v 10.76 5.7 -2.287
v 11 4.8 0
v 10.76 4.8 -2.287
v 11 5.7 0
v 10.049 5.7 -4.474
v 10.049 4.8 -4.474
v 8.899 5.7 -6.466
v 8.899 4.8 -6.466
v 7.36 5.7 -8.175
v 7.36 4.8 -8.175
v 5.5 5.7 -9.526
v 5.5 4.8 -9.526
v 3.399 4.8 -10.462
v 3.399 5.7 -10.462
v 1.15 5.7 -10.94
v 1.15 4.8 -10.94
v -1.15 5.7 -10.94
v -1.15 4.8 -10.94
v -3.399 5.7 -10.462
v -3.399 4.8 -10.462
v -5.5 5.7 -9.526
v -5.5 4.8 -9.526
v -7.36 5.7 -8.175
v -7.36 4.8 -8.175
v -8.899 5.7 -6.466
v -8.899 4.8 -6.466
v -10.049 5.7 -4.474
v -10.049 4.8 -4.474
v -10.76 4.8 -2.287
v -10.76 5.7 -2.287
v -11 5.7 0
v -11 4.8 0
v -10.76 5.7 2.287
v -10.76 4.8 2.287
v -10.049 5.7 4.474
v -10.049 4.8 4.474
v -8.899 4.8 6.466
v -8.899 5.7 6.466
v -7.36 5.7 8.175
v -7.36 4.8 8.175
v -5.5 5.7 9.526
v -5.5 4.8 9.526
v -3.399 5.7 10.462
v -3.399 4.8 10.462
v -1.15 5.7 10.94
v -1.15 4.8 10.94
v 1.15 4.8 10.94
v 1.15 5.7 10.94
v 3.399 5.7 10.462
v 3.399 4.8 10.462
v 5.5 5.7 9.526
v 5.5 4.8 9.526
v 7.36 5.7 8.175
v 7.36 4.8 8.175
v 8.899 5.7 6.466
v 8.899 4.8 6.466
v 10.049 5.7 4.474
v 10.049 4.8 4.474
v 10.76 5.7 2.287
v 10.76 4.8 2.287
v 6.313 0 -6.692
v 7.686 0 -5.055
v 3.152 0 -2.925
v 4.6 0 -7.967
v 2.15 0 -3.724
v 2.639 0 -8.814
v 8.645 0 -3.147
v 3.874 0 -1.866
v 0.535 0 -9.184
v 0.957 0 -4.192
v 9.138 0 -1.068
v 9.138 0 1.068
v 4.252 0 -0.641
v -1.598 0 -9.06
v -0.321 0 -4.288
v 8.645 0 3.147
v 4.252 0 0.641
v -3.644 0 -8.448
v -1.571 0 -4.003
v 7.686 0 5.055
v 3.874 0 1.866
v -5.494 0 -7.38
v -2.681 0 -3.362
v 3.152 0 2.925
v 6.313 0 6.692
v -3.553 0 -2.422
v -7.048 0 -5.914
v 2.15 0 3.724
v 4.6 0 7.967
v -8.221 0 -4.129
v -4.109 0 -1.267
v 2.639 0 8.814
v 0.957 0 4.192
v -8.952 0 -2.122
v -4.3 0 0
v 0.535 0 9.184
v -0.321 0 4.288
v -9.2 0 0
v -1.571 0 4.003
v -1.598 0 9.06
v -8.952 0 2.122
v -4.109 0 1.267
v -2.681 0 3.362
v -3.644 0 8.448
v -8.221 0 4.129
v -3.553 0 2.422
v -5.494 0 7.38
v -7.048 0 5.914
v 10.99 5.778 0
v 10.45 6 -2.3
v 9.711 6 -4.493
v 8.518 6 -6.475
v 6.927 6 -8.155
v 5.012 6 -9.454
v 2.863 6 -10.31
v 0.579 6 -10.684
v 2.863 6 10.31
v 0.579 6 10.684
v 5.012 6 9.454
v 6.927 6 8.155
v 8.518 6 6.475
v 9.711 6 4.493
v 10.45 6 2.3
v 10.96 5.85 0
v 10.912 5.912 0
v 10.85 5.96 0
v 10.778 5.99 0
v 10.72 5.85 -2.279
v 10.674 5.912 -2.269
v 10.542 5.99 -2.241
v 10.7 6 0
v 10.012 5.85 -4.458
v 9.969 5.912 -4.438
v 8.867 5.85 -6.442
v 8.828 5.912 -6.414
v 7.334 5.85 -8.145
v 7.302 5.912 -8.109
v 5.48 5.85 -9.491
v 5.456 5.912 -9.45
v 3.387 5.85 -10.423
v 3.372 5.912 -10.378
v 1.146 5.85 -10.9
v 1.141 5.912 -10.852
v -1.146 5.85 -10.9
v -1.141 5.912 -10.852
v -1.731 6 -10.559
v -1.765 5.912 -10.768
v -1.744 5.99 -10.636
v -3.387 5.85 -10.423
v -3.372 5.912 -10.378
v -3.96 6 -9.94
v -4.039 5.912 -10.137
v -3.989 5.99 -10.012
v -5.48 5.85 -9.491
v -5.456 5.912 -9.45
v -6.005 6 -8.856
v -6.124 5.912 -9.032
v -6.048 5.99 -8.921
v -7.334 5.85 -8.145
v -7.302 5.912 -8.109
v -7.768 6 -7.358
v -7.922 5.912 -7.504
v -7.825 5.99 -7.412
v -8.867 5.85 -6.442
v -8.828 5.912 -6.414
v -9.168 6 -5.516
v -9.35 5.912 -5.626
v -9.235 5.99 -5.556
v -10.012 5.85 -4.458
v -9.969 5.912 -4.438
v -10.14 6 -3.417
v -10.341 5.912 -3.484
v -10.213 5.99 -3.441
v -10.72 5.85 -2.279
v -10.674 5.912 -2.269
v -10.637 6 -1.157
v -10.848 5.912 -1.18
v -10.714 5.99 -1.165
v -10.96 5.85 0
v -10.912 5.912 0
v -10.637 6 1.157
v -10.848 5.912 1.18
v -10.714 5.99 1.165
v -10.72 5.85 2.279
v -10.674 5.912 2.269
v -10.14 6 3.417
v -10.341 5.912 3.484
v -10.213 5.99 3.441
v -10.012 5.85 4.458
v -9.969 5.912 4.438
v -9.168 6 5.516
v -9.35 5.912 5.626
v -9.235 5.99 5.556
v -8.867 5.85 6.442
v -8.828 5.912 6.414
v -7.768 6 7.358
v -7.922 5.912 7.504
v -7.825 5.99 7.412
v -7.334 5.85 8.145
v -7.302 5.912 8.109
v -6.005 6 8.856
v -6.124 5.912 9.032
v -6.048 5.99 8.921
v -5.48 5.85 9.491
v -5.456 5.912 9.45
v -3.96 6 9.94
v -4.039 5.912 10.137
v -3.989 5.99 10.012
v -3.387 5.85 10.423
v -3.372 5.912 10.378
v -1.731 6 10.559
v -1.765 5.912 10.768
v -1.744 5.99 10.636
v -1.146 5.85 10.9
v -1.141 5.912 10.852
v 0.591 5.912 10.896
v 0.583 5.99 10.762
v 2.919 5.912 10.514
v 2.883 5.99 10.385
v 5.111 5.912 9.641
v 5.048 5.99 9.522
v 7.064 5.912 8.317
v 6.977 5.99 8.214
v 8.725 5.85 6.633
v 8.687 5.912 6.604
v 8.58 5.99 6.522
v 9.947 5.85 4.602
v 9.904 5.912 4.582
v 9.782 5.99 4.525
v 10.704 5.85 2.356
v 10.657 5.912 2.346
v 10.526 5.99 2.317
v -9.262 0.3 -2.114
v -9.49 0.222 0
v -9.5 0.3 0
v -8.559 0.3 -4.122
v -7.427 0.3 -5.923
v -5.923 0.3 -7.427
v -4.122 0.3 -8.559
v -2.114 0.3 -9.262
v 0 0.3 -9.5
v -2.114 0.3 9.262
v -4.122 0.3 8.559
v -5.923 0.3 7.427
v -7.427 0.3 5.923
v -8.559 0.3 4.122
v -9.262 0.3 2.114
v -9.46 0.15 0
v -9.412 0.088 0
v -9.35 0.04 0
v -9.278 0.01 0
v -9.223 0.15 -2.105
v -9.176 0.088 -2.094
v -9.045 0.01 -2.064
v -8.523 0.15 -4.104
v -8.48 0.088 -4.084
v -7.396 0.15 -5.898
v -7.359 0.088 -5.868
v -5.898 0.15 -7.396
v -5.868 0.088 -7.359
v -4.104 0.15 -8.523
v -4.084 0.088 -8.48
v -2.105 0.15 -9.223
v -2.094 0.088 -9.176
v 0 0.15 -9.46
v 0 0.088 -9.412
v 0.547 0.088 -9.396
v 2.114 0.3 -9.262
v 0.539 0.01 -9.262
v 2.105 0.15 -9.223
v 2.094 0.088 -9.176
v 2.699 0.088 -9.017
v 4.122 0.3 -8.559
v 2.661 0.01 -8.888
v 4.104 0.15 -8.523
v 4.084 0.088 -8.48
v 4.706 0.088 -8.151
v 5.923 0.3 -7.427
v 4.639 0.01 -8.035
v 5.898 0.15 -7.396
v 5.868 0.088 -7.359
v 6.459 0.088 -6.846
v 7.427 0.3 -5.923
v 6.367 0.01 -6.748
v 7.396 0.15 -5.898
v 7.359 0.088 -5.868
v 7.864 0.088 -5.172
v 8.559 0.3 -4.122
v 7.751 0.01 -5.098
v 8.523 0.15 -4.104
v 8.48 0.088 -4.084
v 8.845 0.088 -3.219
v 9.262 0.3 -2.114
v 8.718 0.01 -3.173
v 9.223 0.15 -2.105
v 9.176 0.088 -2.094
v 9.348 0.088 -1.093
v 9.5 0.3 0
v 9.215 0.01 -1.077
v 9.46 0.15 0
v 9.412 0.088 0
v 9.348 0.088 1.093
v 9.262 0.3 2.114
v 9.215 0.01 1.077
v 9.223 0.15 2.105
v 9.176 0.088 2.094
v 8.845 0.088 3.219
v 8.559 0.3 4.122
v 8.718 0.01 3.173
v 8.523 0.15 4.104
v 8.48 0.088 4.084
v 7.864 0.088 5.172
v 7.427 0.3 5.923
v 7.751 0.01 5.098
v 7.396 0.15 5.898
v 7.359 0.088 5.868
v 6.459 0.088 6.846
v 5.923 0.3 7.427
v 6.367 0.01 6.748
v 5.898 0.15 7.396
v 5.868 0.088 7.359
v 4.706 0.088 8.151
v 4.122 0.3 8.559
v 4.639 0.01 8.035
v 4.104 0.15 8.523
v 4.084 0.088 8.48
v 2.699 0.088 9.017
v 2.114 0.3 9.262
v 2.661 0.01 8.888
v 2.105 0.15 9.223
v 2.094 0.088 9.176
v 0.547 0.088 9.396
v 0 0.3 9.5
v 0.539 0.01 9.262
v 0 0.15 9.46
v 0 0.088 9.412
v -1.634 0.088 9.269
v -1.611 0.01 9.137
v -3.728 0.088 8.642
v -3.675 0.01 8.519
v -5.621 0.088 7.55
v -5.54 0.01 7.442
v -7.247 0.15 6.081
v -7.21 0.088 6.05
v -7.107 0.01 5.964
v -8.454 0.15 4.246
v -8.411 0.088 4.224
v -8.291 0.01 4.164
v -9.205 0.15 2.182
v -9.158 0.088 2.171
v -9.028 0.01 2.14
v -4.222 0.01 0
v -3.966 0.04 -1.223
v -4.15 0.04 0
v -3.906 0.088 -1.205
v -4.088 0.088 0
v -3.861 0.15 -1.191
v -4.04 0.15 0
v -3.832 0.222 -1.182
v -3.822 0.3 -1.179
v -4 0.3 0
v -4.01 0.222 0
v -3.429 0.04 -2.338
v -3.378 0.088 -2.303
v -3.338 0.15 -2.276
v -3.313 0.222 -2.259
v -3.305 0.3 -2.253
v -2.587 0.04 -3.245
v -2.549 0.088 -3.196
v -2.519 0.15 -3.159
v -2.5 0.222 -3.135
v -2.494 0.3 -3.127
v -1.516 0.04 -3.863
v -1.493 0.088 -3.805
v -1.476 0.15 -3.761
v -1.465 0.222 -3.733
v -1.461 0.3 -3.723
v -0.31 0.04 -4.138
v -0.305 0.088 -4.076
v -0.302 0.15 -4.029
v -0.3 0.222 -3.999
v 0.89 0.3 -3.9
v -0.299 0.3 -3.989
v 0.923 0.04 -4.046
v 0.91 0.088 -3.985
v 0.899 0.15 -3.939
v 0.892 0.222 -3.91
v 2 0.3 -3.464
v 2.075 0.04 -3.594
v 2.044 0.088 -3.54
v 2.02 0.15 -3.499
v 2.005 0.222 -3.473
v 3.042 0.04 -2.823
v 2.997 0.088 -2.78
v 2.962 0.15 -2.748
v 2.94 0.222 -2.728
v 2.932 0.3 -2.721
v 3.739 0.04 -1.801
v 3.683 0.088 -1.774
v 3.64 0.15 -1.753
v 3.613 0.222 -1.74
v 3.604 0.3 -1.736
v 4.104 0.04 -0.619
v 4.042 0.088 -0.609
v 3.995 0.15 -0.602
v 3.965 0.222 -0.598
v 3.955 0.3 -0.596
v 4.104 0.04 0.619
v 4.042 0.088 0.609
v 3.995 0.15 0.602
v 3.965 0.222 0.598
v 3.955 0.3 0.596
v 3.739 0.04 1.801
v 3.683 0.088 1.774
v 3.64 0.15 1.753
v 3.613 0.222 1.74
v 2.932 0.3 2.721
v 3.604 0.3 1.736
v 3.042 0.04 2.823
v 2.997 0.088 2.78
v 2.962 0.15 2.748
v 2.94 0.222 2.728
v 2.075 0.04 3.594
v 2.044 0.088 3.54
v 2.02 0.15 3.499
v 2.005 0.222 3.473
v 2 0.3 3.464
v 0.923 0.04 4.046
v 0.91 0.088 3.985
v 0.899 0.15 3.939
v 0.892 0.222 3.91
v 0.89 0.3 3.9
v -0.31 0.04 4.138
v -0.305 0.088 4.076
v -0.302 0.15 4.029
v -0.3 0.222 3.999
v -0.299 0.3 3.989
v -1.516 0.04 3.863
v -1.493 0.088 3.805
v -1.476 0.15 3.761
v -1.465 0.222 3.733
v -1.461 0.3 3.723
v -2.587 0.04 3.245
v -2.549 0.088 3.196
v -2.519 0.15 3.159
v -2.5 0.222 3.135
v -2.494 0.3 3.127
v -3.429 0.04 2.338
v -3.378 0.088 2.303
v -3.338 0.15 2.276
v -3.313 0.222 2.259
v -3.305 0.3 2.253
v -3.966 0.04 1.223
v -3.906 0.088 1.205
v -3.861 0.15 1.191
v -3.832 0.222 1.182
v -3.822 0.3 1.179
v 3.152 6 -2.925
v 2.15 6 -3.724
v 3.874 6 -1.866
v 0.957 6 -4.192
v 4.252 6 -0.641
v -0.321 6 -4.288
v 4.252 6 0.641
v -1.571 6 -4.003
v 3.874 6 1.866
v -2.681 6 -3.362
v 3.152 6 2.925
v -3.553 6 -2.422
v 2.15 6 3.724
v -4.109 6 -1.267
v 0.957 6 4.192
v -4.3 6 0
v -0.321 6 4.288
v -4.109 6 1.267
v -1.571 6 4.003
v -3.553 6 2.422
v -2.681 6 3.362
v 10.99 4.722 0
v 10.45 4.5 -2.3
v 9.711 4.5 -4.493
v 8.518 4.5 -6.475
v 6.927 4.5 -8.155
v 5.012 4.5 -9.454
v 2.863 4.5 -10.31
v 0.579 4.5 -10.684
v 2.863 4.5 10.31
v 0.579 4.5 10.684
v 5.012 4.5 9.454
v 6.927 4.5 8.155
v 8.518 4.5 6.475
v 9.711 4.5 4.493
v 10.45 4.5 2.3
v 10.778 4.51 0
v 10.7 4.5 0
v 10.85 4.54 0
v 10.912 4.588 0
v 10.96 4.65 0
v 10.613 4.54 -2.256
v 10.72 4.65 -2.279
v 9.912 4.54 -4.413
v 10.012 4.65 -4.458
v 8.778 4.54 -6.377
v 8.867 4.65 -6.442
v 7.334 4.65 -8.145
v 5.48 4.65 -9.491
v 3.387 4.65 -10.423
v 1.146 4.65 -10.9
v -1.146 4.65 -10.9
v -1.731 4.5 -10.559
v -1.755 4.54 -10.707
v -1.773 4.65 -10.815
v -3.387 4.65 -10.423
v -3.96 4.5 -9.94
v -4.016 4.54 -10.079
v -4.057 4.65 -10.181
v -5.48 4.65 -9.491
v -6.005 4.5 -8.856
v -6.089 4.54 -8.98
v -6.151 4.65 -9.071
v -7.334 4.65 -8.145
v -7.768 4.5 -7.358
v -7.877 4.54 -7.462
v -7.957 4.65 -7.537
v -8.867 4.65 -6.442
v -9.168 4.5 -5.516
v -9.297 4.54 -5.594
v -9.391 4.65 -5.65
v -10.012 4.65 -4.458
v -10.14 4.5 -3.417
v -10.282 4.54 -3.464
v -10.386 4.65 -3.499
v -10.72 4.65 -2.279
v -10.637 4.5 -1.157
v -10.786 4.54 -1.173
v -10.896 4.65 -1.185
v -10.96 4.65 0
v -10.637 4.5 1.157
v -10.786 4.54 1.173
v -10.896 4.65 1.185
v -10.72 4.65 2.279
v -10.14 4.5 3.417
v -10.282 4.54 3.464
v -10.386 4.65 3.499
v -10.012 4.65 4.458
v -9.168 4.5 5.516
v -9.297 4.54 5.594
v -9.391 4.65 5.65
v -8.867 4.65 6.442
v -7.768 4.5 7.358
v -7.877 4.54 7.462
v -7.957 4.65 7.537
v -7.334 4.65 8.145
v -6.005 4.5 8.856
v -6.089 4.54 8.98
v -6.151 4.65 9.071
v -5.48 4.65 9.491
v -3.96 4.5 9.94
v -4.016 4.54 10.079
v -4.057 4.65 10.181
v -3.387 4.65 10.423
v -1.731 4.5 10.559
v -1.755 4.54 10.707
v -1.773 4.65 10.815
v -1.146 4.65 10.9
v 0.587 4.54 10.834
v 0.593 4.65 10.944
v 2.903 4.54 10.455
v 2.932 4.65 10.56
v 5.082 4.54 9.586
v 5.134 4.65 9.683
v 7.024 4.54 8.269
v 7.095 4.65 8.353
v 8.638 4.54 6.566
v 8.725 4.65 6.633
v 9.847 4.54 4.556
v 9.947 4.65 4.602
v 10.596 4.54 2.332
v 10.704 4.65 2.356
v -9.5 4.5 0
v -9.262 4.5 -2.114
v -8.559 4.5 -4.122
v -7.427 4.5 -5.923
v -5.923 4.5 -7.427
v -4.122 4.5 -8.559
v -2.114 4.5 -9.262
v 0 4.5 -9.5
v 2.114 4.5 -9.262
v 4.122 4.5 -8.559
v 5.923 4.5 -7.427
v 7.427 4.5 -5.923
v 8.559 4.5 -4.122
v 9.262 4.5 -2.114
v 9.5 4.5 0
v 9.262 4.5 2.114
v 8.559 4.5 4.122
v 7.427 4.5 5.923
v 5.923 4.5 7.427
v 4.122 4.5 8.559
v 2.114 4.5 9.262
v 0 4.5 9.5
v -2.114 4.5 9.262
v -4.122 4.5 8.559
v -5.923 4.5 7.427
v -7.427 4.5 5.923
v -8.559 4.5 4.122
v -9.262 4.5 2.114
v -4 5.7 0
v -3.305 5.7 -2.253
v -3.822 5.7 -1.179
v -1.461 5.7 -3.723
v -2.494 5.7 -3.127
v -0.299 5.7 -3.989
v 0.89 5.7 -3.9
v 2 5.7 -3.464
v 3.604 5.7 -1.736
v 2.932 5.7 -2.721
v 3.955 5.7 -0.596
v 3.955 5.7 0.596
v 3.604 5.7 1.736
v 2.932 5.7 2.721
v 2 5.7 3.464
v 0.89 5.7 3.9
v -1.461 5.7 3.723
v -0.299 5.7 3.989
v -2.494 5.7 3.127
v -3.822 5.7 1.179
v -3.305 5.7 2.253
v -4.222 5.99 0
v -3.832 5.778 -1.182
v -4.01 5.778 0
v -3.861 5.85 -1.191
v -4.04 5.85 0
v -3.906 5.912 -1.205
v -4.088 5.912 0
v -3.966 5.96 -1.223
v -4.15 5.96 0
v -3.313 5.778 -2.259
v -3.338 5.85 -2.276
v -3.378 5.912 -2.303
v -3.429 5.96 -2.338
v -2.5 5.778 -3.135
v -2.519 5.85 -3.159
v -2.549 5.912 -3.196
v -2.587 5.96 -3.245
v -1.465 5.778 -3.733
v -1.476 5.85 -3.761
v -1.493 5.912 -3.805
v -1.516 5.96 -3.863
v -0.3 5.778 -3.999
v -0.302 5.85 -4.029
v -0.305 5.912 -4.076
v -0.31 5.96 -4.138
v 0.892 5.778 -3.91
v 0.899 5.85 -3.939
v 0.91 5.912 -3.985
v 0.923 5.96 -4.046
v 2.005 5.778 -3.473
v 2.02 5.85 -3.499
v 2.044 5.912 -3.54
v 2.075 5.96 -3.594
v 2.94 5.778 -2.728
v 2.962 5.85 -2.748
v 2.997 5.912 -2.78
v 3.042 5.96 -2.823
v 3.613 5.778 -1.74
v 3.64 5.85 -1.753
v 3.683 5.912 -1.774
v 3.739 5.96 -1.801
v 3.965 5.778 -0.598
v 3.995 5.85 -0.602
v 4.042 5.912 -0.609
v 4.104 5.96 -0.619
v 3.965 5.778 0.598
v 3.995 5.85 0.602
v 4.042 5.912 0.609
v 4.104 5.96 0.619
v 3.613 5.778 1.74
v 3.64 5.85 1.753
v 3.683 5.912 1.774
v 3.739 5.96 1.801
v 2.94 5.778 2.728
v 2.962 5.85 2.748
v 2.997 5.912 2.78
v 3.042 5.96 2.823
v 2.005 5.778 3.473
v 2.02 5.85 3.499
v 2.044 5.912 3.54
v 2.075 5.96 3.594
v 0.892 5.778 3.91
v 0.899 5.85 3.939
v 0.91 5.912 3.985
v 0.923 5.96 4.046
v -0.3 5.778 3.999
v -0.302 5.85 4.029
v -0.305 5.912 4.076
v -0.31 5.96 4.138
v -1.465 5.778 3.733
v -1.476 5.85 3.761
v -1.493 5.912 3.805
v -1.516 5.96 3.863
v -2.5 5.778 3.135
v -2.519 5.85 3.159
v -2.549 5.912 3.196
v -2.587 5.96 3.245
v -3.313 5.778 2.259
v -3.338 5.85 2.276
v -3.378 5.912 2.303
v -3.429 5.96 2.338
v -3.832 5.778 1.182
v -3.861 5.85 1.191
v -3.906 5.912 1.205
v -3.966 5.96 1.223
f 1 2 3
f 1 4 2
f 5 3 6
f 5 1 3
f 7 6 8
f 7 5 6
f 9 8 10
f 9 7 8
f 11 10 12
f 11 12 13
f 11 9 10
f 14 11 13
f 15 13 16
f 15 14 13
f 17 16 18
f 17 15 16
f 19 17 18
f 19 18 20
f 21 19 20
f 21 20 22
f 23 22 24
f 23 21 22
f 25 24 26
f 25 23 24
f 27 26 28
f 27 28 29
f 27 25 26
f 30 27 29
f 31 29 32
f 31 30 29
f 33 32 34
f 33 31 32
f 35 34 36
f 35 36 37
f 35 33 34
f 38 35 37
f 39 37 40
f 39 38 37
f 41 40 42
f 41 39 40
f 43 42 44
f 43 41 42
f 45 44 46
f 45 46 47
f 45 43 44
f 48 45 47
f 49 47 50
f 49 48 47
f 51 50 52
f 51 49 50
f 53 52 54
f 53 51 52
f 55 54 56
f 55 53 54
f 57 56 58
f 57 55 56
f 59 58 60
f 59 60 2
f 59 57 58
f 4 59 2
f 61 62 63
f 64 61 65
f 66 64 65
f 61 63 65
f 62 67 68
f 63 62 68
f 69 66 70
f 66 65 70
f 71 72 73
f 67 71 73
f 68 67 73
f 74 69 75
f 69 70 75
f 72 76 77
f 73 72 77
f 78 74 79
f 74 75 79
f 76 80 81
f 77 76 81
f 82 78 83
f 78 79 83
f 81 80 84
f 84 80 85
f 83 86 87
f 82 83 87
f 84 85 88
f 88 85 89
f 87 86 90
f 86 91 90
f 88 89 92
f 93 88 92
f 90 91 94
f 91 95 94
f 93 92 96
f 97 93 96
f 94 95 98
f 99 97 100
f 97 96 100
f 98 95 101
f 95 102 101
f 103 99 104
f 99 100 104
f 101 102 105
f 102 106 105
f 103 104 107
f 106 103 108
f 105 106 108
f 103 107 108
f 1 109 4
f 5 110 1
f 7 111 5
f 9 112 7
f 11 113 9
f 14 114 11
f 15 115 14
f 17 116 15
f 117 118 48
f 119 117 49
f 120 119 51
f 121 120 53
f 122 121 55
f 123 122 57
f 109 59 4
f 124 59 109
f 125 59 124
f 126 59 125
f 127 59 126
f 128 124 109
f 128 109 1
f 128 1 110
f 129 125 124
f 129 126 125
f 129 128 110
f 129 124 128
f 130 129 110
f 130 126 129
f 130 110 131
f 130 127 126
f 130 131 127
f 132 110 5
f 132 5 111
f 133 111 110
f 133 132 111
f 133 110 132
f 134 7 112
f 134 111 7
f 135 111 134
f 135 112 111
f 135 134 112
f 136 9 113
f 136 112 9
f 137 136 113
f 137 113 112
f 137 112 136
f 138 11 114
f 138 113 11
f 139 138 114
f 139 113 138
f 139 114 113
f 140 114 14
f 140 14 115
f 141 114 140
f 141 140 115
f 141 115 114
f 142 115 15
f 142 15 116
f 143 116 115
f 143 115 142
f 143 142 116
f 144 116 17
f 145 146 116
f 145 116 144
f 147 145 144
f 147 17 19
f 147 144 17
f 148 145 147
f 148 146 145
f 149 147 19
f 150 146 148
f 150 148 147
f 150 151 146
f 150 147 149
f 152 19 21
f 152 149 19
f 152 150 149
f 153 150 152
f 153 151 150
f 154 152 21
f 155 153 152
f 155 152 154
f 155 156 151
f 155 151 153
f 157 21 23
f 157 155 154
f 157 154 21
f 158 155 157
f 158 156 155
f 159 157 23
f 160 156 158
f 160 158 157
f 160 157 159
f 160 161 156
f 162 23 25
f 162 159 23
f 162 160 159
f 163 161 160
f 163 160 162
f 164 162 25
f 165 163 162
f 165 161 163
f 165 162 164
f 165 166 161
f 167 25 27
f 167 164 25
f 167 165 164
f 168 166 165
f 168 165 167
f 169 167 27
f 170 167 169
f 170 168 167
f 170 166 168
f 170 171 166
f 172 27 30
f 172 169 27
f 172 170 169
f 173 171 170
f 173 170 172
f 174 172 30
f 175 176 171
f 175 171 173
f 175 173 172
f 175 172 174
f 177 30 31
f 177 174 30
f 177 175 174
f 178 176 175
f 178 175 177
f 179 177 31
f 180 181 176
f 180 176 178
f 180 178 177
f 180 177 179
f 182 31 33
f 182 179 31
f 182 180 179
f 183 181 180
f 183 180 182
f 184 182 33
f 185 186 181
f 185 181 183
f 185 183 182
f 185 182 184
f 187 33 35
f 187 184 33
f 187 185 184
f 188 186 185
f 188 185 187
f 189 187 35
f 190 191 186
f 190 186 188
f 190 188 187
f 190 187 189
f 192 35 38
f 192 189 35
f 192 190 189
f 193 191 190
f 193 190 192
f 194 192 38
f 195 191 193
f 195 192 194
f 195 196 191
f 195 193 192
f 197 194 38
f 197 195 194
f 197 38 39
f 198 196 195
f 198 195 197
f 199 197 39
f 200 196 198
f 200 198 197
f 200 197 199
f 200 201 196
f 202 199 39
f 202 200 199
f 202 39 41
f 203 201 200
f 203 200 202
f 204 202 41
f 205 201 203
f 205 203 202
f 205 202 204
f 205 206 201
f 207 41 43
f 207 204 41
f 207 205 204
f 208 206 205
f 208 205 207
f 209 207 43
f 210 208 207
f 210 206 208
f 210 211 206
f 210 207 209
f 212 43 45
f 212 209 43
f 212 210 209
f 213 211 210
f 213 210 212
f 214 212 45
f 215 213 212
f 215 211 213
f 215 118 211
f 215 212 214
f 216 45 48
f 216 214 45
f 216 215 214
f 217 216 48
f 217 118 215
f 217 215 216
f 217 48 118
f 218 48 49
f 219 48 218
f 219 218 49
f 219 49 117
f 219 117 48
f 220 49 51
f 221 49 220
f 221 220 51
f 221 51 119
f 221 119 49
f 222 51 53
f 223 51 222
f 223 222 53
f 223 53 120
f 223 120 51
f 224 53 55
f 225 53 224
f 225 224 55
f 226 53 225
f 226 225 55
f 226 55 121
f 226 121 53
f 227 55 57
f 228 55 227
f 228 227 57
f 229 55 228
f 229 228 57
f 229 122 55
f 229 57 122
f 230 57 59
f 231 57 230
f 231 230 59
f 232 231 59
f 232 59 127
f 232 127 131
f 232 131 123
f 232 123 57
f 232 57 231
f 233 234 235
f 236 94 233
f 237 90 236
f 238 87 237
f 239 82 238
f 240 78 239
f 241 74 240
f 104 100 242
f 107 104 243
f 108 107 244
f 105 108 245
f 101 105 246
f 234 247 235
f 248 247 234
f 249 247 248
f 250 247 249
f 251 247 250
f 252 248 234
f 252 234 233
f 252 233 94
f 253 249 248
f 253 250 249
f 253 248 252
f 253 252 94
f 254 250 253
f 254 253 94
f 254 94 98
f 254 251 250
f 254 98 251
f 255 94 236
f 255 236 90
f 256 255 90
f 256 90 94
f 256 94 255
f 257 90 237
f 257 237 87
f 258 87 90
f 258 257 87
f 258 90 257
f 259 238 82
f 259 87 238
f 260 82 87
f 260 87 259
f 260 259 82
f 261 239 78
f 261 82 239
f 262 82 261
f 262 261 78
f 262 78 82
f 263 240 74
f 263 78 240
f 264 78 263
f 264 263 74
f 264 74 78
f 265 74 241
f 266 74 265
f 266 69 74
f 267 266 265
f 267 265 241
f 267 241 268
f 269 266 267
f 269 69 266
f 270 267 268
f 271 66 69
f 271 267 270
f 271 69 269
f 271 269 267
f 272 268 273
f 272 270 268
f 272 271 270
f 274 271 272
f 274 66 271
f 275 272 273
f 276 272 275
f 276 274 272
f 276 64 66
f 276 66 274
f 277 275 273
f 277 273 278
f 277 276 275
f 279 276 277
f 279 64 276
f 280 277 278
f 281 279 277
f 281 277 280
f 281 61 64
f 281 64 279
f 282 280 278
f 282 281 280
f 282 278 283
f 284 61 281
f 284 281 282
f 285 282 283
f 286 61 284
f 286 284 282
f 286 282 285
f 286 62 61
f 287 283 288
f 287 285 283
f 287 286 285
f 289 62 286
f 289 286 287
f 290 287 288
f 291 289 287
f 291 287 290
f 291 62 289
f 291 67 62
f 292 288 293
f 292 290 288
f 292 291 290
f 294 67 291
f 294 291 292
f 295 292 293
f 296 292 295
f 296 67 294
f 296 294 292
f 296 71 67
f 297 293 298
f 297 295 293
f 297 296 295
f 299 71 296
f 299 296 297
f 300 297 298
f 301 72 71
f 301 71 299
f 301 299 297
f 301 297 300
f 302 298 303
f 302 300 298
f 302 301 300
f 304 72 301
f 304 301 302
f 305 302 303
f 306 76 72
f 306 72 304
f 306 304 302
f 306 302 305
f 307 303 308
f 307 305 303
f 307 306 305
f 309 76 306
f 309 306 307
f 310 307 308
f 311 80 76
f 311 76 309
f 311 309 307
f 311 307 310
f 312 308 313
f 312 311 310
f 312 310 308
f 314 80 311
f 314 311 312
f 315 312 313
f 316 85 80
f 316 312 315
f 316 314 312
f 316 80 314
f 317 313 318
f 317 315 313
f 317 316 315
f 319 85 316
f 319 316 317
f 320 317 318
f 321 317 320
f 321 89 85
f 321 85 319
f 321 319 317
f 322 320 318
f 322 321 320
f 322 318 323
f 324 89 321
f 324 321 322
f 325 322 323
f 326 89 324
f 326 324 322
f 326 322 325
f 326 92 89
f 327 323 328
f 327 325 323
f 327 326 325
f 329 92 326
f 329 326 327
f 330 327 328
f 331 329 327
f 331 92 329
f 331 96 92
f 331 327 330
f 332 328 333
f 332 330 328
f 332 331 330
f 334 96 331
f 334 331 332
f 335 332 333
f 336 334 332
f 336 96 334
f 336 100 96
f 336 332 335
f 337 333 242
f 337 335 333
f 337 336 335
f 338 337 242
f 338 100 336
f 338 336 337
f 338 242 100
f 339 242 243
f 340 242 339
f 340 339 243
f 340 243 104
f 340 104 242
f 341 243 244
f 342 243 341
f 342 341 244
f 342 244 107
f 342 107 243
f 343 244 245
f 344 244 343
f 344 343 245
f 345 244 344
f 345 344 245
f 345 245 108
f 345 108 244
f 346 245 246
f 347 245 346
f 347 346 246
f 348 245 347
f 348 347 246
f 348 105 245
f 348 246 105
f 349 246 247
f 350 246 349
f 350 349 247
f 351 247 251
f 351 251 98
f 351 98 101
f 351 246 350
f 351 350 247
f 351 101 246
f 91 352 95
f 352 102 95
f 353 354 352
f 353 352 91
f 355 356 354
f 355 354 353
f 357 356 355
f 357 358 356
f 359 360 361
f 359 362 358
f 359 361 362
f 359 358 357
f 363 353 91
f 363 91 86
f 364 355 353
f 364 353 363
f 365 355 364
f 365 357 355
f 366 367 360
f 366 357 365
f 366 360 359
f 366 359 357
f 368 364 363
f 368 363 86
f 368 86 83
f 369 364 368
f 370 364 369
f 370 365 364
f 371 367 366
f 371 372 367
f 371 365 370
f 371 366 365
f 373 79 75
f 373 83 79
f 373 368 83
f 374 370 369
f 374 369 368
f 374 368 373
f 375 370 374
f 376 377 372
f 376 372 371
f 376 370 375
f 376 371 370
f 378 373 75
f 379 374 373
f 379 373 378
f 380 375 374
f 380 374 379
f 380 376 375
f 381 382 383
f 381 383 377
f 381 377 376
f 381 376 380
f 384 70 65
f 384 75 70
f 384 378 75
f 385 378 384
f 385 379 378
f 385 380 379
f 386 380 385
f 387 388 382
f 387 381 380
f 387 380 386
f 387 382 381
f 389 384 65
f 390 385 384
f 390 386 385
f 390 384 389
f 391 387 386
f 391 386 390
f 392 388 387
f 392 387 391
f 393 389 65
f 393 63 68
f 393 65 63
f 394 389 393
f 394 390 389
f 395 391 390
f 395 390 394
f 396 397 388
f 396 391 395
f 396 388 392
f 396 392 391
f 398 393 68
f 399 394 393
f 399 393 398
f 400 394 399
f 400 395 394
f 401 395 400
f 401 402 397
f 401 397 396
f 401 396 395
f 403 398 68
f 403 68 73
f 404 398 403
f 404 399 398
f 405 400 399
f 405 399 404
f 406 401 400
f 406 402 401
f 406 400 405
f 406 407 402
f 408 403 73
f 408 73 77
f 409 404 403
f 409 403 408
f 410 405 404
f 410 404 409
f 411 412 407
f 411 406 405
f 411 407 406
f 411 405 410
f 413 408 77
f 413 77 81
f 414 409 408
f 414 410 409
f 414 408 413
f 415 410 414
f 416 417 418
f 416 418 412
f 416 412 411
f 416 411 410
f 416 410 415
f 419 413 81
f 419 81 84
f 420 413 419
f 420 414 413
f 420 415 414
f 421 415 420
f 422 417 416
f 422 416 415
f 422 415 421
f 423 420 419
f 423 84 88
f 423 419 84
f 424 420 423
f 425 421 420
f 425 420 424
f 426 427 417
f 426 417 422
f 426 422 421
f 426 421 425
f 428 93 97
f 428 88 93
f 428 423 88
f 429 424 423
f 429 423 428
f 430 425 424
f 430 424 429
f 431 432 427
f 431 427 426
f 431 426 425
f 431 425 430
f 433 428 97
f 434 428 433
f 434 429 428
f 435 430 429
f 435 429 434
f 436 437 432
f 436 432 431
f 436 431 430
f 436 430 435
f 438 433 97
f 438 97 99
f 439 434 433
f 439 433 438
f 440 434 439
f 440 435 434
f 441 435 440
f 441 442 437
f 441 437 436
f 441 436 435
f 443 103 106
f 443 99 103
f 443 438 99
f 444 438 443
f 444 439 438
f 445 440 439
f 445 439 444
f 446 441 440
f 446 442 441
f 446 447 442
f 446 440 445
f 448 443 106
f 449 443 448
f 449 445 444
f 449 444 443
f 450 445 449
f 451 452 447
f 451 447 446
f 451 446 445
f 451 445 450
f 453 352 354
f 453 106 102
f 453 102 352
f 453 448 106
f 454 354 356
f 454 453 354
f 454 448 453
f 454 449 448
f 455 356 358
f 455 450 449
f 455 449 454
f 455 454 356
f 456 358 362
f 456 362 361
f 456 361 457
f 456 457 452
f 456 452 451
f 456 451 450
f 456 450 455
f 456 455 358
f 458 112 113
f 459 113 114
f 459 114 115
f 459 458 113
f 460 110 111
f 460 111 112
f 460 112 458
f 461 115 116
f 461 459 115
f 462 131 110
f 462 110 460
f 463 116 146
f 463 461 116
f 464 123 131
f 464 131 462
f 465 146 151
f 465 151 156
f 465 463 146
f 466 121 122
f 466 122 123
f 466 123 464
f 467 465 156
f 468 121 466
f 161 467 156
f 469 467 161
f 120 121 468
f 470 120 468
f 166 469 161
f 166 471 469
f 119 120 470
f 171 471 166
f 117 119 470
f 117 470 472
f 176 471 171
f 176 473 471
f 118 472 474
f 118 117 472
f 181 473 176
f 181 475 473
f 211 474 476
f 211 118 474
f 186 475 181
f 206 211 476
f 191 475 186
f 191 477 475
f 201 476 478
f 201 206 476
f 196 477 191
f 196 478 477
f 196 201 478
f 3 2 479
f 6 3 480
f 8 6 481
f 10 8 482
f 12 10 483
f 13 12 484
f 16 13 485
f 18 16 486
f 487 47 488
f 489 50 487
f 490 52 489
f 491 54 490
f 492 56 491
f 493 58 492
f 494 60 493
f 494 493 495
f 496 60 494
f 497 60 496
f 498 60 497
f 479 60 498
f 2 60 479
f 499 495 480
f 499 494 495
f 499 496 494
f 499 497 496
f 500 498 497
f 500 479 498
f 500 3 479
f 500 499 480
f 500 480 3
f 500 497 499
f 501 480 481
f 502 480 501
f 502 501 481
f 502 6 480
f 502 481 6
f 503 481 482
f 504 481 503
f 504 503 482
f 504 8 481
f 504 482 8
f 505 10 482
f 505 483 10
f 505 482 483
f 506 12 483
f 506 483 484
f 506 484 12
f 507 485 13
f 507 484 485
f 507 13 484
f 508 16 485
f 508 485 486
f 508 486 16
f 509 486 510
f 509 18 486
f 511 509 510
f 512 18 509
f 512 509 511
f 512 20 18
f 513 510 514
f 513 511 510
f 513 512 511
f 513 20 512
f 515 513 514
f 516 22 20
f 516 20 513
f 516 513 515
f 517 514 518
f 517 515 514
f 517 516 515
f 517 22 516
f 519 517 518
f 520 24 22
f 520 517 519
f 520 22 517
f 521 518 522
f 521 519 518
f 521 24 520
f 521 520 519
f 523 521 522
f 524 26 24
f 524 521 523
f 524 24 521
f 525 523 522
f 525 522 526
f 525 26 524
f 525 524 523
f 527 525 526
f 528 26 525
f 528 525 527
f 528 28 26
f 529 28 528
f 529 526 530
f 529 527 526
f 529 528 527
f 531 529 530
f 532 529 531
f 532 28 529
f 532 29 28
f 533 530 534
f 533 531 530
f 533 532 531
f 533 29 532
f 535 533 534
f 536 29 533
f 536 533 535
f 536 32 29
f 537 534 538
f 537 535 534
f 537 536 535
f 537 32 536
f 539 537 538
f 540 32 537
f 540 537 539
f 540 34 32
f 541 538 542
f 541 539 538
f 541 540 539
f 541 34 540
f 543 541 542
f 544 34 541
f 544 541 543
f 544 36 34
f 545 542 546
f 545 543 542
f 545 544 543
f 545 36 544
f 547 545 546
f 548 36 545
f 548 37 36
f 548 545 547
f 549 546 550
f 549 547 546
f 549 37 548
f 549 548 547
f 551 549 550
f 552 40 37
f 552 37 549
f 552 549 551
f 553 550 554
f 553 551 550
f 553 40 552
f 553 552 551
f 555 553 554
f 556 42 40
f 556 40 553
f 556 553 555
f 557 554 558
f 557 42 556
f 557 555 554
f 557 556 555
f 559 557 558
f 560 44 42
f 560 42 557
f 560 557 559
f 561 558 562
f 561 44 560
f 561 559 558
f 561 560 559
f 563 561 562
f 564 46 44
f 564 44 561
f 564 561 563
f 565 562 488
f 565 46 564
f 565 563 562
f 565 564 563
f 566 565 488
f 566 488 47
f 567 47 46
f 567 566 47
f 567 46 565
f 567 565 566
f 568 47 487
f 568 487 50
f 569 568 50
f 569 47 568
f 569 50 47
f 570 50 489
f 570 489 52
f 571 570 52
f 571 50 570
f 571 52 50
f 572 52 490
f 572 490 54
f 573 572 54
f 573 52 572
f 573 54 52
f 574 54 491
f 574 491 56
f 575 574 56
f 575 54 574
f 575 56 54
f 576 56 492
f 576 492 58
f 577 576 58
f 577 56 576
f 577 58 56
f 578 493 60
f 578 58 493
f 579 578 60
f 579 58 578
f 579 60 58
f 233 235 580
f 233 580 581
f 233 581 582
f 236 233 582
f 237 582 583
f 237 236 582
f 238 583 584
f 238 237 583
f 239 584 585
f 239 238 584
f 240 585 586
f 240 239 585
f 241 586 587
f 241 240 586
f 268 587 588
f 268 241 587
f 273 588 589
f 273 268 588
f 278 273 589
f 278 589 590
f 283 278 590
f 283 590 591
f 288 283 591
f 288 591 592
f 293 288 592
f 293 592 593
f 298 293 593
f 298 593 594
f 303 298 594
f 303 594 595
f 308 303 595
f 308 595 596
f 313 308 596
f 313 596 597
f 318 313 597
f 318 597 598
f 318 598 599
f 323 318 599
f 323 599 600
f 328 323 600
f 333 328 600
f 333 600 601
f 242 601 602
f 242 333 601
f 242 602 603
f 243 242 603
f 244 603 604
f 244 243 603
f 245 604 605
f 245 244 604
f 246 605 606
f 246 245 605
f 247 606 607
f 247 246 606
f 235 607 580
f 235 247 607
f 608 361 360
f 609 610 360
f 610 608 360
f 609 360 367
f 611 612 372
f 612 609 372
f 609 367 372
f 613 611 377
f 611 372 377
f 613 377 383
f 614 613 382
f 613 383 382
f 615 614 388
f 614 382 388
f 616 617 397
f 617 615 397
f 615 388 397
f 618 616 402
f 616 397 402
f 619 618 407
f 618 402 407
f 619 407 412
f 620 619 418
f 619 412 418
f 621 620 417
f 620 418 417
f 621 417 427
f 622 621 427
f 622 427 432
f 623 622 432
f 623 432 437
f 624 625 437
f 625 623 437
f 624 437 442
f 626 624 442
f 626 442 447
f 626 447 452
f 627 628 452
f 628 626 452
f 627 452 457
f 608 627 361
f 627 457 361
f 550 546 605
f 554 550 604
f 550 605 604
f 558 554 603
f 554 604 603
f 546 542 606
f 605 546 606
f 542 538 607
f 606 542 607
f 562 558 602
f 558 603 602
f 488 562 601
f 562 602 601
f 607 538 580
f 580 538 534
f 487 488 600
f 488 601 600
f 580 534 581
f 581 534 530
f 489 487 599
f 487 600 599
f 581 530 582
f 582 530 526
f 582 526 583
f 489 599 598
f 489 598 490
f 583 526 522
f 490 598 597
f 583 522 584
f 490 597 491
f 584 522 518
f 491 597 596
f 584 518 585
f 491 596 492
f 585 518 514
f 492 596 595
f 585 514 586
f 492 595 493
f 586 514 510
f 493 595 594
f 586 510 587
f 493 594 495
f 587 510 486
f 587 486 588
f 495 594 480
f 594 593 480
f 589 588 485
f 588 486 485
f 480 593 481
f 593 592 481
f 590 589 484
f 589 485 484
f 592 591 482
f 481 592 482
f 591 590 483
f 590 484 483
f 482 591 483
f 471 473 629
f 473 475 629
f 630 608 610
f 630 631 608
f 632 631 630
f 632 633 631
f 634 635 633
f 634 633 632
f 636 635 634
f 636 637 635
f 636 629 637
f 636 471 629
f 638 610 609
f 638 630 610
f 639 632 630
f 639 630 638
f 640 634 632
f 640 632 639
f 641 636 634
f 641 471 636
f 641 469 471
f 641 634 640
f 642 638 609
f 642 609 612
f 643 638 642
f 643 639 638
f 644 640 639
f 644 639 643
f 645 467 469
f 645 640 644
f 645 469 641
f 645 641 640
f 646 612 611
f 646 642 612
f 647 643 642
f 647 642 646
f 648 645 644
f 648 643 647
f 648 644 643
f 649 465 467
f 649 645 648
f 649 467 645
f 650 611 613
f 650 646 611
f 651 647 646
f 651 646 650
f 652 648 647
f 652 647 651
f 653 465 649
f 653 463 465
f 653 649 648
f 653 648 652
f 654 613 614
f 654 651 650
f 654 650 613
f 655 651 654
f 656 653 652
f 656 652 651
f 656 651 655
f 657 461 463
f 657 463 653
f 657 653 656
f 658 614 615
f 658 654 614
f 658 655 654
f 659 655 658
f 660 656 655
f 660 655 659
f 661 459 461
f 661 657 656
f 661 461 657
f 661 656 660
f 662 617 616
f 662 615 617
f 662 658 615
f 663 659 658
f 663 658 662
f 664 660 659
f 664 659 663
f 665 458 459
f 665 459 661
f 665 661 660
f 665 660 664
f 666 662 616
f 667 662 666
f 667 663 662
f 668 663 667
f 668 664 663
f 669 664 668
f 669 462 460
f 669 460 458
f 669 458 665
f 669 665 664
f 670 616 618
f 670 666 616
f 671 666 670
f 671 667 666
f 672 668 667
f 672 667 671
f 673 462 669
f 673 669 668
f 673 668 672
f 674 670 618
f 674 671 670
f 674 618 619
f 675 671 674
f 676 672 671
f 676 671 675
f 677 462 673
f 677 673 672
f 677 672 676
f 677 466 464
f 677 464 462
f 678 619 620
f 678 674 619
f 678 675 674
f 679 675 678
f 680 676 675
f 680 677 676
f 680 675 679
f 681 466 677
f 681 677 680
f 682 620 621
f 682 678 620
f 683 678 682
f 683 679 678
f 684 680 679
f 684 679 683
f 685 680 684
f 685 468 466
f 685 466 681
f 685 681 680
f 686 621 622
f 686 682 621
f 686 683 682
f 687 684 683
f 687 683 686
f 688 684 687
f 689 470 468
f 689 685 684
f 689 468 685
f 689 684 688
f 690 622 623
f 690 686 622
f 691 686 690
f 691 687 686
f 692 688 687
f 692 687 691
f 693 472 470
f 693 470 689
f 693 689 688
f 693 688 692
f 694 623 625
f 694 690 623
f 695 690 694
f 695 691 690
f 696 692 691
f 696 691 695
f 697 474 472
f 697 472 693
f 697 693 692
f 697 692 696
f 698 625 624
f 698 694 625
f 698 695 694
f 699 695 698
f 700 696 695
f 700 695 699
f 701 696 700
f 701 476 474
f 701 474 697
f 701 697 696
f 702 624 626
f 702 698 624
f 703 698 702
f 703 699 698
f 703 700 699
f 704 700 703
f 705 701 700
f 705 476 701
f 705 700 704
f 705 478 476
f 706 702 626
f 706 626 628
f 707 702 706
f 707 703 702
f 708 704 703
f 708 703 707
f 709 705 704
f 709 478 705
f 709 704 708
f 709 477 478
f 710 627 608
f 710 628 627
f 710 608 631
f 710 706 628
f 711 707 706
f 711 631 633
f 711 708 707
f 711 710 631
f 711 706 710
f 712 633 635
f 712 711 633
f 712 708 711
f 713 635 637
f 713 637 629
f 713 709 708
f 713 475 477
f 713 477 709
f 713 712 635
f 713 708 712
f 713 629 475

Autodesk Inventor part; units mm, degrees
ref_plane "YZ Plane" through (0, 0, 0) normal (1, 0, 0) x (0, 1, 0)
ref_plane "XZ Plane" through (0, 0, 0) normal (0, 1, 0) x (-1, 0, 0)
ref_plane "XY Plane" through (0, 0, 0) normal (0, 0, 1) x (1, 0, 0)
sketch "スケッチ1" plane through (0, 0, 0) normal (0, 1, 0) x (-1, 0, 0)
  circle A0 centre (0, 0) radius 4
  circle A1 centre (0, 0) radius 9.5
  dimension "d0" = 8
  dimension "d1" = 19
extrude "押し出し1" add sketch "スケッチ1" along normal blind 6
sketch "スケッチ2" plane through (0, 6, 0) normal (0, 1, 0) x (1, 0, 0)
  circle A0 centre (0, 0) radius 11
  circle A1 centre (0, 0) radius 9.5 projected
  dimension "d4" = 22
extrude "押し出し2" add sketch "スケッチ2" against normal blind 1.5
fillet "フィレット1" radius 0.3 5 edges at (-11, 6, 0) (-11, 4.5, 0) (9.5, 0, 0) (4, 6, 0) (4, 0, 0)
properties part number "p8-19flange" material "鋼 AISI 1006 85 HR"
